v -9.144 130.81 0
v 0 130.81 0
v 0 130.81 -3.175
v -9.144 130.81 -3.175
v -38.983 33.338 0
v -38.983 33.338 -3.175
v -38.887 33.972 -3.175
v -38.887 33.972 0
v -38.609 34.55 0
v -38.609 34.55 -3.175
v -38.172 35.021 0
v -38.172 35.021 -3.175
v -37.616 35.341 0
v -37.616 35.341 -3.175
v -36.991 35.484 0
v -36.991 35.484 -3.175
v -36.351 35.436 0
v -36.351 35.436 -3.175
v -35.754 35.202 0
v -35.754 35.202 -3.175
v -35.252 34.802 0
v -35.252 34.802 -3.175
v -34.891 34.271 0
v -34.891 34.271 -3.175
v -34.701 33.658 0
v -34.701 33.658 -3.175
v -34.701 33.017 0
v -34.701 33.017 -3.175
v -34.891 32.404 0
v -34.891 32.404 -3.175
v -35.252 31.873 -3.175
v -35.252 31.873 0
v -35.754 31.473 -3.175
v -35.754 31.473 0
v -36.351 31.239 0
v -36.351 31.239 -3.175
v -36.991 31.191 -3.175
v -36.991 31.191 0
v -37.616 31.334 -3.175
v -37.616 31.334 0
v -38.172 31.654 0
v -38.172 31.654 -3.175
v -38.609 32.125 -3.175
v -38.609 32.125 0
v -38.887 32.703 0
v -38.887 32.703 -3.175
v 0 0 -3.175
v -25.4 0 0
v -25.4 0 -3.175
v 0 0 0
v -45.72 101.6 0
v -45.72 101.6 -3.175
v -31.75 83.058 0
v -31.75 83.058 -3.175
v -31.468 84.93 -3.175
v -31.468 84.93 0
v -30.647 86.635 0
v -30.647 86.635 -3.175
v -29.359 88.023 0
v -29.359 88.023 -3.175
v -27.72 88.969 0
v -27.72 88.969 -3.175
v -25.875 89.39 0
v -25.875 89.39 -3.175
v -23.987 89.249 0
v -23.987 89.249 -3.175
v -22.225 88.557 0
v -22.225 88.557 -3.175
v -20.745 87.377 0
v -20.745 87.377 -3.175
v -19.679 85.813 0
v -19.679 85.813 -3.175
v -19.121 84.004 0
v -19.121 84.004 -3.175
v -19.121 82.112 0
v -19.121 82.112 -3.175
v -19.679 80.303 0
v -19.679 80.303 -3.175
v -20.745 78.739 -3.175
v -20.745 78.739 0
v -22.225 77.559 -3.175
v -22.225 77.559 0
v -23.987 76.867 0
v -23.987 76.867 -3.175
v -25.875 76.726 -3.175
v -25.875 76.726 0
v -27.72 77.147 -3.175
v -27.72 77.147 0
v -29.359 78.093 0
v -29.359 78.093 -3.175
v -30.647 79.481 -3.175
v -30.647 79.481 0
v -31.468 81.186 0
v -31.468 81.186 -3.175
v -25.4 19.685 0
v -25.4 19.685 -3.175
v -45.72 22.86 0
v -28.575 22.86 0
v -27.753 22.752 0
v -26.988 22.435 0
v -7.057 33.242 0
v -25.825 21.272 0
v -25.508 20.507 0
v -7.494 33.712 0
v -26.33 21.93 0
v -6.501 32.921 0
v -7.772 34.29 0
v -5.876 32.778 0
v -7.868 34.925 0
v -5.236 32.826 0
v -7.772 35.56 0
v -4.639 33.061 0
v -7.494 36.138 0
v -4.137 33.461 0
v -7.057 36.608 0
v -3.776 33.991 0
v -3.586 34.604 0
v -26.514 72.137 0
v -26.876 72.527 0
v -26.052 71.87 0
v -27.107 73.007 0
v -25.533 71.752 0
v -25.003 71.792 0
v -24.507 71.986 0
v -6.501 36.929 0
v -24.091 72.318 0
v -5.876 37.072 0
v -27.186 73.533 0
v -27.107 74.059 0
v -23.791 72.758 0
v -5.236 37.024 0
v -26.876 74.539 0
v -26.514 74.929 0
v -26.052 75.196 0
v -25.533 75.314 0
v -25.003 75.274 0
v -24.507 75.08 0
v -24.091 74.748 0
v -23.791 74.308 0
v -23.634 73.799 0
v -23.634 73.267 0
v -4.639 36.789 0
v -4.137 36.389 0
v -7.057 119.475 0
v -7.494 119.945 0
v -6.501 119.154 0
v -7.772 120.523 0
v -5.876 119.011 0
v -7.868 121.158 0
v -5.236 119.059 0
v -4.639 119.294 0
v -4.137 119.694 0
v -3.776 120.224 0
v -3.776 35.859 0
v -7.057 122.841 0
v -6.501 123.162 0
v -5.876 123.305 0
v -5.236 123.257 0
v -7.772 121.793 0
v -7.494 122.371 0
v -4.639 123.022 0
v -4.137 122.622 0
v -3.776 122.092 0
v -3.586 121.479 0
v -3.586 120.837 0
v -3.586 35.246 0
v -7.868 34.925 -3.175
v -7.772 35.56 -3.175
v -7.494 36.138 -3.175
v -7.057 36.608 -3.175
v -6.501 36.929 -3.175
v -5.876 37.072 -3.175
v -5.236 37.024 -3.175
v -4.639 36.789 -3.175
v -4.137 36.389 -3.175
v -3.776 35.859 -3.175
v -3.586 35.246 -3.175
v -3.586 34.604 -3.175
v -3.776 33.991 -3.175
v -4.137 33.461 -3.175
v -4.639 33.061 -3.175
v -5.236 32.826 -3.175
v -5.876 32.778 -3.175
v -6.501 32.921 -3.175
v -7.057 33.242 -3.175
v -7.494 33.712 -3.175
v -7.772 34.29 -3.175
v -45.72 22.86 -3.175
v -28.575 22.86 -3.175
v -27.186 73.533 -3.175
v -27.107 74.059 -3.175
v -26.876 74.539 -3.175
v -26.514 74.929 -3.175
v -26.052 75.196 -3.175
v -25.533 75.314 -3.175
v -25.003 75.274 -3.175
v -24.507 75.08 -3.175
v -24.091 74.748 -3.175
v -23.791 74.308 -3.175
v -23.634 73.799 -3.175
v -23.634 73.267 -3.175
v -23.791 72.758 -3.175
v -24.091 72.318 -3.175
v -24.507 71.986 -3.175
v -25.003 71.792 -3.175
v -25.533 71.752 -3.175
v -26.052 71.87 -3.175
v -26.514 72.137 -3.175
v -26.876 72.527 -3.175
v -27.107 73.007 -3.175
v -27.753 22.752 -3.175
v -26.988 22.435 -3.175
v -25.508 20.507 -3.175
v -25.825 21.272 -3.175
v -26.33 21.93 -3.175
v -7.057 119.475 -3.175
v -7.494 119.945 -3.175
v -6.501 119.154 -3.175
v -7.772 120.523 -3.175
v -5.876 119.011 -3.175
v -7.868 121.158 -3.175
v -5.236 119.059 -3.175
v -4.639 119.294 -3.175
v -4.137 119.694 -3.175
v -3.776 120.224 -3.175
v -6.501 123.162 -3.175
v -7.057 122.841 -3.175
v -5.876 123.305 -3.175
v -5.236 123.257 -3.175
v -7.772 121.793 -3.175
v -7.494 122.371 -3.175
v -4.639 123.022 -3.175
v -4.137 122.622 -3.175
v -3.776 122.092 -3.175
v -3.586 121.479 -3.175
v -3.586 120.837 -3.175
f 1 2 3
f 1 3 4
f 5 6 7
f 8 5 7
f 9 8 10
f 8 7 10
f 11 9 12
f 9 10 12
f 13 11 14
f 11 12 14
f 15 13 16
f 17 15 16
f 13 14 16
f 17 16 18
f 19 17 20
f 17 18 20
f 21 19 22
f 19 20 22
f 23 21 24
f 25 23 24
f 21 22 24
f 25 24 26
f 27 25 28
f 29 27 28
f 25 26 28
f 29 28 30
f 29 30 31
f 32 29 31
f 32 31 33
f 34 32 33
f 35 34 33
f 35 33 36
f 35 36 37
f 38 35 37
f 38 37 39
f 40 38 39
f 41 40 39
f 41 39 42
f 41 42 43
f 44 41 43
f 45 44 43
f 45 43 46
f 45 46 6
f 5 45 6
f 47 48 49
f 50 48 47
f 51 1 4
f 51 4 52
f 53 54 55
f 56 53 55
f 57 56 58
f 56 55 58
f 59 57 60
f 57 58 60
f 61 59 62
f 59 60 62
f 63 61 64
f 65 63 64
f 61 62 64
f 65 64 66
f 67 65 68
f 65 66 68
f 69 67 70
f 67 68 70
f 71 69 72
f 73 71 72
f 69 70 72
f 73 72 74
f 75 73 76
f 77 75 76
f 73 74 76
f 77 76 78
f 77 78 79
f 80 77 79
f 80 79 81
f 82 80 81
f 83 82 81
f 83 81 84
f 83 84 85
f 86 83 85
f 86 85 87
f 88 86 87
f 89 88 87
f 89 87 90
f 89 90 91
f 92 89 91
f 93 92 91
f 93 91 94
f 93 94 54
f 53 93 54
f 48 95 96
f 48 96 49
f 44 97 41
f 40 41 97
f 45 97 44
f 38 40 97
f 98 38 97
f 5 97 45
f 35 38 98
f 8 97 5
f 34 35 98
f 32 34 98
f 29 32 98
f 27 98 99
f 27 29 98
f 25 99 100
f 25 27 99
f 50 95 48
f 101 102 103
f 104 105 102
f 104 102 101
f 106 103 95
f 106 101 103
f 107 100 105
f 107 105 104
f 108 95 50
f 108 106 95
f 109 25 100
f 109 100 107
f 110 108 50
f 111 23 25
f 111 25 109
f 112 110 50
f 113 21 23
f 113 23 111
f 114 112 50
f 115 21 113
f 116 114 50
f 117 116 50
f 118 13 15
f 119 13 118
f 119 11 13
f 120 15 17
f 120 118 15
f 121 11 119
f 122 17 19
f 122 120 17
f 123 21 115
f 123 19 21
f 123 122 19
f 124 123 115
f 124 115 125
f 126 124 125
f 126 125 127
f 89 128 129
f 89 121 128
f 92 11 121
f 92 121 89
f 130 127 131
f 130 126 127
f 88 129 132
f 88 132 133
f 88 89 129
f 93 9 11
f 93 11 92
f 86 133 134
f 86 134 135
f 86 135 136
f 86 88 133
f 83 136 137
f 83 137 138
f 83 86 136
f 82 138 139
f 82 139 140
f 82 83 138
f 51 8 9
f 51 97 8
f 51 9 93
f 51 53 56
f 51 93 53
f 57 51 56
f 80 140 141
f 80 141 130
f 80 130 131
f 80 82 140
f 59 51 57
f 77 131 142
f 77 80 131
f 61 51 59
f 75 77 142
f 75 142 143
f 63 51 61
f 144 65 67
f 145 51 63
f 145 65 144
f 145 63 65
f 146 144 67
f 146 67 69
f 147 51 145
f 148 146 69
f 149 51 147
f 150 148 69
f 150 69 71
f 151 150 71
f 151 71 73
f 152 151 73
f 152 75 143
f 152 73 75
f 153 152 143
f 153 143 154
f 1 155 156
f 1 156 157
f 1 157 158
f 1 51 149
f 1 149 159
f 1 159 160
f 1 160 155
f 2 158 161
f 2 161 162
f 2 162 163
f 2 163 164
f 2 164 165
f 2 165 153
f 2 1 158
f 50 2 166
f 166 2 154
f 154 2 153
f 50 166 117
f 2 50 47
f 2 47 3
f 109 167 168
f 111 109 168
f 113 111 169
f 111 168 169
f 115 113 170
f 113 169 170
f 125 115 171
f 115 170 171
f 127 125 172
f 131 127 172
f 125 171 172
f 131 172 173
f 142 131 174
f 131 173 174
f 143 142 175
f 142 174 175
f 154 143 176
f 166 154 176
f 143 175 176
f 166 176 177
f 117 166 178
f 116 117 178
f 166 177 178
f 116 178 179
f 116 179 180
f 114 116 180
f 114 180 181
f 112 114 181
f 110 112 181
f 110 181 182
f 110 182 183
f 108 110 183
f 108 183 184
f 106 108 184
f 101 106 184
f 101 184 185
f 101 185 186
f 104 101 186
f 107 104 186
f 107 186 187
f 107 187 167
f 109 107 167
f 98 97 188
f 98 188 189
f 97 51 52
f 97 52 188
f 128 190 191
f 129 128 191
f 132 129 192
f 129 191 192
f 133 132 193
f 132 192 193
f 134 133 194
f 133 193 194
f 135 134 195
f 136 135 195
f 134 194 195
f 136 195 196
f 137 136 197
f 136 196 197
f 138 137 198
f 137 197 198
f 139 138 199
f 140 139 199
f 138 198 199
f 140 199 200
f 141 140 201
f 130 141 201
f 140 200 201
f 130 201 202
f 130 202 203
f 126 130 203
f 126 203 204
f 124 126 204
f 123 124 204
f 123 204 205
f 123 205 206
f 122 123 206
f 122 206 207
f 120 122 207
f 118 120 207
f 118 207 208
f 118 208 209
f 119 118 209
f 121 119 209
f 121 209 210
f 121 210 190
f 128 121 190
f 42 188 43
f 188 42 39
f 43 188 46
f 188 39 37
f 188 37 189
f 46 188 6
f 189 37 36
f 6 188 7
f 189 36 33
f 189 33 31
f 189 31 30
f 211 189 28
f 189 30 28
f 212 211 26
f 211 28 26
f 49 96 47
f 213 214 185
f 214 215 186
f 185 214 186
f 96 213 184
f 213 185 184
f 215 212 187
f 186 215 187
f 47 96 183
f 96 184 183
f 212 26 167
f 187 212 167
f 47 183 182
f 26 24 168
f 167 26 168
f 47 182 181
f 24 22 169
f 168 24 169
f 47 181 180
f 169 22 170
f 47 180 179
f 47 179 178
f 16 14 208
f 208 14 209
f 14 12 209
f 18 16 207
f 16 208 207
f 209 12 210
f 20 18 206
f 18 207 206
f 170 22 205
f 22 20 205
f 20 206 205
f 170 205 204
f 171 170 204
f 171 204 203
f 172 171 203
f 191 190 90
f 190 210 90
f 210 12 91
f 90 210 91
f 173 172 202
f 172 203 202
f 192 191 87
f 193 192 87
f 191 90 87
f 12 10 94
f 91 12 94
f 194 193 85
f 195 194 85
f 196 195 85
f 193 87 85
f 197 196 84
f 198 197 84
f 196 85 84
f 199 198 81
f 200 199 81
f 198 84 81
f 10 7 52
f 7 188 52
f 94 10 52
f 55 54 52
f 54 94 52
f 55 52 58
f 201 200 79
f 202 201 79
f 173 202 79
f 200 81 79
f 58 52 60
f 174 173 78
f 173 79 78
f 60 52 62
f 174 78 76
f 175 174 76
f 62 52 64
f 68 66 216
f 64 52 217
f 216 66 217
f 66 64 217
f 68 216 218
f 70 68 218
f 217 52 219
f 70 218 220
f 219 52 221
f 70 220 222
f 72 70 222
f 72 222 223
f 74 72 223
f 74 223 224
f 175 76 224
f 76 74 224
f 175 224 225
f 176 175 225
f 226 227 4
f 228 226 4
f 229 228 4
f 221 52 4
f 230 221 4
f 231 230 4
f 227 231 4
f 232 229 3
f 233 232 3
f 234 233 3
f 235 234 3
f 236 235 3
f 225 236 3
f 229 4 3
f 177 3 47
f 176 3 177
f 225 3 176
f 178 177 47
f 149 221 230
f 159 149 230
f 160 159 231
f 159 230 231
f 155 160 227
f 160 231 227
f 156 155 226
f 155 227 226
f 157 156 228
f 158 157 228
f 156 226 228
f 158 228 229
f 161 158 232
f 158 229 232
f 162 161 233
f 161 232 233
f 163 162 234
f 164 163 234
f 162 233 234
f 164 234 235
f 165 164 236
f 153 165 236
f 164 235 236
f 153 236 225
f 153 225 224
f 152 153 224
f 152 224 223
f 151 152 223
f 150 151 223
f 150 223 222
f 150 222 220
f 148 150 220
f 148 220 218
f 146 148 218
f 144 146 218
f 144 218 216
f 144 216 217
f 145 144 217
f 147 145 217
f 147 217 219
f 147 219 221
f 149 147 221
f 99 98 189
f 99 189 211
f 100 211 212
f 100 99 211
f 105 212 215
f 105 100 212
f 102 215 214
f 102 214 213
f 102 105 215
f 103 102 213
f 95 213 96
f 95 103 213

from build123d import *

# Parameters (mm, degrees)
BOSS_EXTRUDE1_DEPTH             = 3.175
F_6_CLEARANCE_HOLE1_D           = 4.3053
F_1_2_0_5_DIAMETER_HOLE1_D      = 12.7
F_9_64_0_14063_DIAMETER_HOLE1_D = 3.572002


with BuildPart() as part:
    # Sketch1 → Boss-Extrude1 (new body)
    with BuildSketch(Plane.XY):
        with BuildLine():
            Line((-25.4, 0), (0, 0))
            Line((0, 0), (0, 130.81))
            Line((0, 130.81), (-9.144, 130.81))
            Line((-9.144, 130.81), (-45.72, 101.6))
            Line((-45.72, 101.6), (-45.72, 22.86))
            Line((-45.72, 22.86), (-28.575, 22.86))
            ThreePointArc((-28.575, 22.86), (-26.32993597, 21.93006403), (-25.4, 19.685))
            Line((-25.4, 19.685), (-25.4, 0))
        make_face()
    extrude(amount=-BOSS_EXTRUDE1_DEPTH)

    # #6 Clearance Hole1 (through all)
    with Locations(Plane.XY):
        with Locations((-5.715, 34.925), (-36.83, 33.3375), (-5.715, 121.158)):
            Hole(F_6_CLEARANCE_HOLE1_D / 2)

    # 1/2 (0.5) Diameter Hole1 (through all)
    with Locations(Plane.XY):
        with Locations((-25.4, 83.058)):
            Hole(F_1_2_0_5_DIAMETER_HOLE1_D / 2)

    # 9/64 (0.14063) Diameter Hole1 (through all)
    with Locations(Plane.XY):
        with Locations((-25.4, 73.533)):
            Hole(F_9_64_0_14063_DIAMETER_HOLE1_D / 2)


solid = part.part
